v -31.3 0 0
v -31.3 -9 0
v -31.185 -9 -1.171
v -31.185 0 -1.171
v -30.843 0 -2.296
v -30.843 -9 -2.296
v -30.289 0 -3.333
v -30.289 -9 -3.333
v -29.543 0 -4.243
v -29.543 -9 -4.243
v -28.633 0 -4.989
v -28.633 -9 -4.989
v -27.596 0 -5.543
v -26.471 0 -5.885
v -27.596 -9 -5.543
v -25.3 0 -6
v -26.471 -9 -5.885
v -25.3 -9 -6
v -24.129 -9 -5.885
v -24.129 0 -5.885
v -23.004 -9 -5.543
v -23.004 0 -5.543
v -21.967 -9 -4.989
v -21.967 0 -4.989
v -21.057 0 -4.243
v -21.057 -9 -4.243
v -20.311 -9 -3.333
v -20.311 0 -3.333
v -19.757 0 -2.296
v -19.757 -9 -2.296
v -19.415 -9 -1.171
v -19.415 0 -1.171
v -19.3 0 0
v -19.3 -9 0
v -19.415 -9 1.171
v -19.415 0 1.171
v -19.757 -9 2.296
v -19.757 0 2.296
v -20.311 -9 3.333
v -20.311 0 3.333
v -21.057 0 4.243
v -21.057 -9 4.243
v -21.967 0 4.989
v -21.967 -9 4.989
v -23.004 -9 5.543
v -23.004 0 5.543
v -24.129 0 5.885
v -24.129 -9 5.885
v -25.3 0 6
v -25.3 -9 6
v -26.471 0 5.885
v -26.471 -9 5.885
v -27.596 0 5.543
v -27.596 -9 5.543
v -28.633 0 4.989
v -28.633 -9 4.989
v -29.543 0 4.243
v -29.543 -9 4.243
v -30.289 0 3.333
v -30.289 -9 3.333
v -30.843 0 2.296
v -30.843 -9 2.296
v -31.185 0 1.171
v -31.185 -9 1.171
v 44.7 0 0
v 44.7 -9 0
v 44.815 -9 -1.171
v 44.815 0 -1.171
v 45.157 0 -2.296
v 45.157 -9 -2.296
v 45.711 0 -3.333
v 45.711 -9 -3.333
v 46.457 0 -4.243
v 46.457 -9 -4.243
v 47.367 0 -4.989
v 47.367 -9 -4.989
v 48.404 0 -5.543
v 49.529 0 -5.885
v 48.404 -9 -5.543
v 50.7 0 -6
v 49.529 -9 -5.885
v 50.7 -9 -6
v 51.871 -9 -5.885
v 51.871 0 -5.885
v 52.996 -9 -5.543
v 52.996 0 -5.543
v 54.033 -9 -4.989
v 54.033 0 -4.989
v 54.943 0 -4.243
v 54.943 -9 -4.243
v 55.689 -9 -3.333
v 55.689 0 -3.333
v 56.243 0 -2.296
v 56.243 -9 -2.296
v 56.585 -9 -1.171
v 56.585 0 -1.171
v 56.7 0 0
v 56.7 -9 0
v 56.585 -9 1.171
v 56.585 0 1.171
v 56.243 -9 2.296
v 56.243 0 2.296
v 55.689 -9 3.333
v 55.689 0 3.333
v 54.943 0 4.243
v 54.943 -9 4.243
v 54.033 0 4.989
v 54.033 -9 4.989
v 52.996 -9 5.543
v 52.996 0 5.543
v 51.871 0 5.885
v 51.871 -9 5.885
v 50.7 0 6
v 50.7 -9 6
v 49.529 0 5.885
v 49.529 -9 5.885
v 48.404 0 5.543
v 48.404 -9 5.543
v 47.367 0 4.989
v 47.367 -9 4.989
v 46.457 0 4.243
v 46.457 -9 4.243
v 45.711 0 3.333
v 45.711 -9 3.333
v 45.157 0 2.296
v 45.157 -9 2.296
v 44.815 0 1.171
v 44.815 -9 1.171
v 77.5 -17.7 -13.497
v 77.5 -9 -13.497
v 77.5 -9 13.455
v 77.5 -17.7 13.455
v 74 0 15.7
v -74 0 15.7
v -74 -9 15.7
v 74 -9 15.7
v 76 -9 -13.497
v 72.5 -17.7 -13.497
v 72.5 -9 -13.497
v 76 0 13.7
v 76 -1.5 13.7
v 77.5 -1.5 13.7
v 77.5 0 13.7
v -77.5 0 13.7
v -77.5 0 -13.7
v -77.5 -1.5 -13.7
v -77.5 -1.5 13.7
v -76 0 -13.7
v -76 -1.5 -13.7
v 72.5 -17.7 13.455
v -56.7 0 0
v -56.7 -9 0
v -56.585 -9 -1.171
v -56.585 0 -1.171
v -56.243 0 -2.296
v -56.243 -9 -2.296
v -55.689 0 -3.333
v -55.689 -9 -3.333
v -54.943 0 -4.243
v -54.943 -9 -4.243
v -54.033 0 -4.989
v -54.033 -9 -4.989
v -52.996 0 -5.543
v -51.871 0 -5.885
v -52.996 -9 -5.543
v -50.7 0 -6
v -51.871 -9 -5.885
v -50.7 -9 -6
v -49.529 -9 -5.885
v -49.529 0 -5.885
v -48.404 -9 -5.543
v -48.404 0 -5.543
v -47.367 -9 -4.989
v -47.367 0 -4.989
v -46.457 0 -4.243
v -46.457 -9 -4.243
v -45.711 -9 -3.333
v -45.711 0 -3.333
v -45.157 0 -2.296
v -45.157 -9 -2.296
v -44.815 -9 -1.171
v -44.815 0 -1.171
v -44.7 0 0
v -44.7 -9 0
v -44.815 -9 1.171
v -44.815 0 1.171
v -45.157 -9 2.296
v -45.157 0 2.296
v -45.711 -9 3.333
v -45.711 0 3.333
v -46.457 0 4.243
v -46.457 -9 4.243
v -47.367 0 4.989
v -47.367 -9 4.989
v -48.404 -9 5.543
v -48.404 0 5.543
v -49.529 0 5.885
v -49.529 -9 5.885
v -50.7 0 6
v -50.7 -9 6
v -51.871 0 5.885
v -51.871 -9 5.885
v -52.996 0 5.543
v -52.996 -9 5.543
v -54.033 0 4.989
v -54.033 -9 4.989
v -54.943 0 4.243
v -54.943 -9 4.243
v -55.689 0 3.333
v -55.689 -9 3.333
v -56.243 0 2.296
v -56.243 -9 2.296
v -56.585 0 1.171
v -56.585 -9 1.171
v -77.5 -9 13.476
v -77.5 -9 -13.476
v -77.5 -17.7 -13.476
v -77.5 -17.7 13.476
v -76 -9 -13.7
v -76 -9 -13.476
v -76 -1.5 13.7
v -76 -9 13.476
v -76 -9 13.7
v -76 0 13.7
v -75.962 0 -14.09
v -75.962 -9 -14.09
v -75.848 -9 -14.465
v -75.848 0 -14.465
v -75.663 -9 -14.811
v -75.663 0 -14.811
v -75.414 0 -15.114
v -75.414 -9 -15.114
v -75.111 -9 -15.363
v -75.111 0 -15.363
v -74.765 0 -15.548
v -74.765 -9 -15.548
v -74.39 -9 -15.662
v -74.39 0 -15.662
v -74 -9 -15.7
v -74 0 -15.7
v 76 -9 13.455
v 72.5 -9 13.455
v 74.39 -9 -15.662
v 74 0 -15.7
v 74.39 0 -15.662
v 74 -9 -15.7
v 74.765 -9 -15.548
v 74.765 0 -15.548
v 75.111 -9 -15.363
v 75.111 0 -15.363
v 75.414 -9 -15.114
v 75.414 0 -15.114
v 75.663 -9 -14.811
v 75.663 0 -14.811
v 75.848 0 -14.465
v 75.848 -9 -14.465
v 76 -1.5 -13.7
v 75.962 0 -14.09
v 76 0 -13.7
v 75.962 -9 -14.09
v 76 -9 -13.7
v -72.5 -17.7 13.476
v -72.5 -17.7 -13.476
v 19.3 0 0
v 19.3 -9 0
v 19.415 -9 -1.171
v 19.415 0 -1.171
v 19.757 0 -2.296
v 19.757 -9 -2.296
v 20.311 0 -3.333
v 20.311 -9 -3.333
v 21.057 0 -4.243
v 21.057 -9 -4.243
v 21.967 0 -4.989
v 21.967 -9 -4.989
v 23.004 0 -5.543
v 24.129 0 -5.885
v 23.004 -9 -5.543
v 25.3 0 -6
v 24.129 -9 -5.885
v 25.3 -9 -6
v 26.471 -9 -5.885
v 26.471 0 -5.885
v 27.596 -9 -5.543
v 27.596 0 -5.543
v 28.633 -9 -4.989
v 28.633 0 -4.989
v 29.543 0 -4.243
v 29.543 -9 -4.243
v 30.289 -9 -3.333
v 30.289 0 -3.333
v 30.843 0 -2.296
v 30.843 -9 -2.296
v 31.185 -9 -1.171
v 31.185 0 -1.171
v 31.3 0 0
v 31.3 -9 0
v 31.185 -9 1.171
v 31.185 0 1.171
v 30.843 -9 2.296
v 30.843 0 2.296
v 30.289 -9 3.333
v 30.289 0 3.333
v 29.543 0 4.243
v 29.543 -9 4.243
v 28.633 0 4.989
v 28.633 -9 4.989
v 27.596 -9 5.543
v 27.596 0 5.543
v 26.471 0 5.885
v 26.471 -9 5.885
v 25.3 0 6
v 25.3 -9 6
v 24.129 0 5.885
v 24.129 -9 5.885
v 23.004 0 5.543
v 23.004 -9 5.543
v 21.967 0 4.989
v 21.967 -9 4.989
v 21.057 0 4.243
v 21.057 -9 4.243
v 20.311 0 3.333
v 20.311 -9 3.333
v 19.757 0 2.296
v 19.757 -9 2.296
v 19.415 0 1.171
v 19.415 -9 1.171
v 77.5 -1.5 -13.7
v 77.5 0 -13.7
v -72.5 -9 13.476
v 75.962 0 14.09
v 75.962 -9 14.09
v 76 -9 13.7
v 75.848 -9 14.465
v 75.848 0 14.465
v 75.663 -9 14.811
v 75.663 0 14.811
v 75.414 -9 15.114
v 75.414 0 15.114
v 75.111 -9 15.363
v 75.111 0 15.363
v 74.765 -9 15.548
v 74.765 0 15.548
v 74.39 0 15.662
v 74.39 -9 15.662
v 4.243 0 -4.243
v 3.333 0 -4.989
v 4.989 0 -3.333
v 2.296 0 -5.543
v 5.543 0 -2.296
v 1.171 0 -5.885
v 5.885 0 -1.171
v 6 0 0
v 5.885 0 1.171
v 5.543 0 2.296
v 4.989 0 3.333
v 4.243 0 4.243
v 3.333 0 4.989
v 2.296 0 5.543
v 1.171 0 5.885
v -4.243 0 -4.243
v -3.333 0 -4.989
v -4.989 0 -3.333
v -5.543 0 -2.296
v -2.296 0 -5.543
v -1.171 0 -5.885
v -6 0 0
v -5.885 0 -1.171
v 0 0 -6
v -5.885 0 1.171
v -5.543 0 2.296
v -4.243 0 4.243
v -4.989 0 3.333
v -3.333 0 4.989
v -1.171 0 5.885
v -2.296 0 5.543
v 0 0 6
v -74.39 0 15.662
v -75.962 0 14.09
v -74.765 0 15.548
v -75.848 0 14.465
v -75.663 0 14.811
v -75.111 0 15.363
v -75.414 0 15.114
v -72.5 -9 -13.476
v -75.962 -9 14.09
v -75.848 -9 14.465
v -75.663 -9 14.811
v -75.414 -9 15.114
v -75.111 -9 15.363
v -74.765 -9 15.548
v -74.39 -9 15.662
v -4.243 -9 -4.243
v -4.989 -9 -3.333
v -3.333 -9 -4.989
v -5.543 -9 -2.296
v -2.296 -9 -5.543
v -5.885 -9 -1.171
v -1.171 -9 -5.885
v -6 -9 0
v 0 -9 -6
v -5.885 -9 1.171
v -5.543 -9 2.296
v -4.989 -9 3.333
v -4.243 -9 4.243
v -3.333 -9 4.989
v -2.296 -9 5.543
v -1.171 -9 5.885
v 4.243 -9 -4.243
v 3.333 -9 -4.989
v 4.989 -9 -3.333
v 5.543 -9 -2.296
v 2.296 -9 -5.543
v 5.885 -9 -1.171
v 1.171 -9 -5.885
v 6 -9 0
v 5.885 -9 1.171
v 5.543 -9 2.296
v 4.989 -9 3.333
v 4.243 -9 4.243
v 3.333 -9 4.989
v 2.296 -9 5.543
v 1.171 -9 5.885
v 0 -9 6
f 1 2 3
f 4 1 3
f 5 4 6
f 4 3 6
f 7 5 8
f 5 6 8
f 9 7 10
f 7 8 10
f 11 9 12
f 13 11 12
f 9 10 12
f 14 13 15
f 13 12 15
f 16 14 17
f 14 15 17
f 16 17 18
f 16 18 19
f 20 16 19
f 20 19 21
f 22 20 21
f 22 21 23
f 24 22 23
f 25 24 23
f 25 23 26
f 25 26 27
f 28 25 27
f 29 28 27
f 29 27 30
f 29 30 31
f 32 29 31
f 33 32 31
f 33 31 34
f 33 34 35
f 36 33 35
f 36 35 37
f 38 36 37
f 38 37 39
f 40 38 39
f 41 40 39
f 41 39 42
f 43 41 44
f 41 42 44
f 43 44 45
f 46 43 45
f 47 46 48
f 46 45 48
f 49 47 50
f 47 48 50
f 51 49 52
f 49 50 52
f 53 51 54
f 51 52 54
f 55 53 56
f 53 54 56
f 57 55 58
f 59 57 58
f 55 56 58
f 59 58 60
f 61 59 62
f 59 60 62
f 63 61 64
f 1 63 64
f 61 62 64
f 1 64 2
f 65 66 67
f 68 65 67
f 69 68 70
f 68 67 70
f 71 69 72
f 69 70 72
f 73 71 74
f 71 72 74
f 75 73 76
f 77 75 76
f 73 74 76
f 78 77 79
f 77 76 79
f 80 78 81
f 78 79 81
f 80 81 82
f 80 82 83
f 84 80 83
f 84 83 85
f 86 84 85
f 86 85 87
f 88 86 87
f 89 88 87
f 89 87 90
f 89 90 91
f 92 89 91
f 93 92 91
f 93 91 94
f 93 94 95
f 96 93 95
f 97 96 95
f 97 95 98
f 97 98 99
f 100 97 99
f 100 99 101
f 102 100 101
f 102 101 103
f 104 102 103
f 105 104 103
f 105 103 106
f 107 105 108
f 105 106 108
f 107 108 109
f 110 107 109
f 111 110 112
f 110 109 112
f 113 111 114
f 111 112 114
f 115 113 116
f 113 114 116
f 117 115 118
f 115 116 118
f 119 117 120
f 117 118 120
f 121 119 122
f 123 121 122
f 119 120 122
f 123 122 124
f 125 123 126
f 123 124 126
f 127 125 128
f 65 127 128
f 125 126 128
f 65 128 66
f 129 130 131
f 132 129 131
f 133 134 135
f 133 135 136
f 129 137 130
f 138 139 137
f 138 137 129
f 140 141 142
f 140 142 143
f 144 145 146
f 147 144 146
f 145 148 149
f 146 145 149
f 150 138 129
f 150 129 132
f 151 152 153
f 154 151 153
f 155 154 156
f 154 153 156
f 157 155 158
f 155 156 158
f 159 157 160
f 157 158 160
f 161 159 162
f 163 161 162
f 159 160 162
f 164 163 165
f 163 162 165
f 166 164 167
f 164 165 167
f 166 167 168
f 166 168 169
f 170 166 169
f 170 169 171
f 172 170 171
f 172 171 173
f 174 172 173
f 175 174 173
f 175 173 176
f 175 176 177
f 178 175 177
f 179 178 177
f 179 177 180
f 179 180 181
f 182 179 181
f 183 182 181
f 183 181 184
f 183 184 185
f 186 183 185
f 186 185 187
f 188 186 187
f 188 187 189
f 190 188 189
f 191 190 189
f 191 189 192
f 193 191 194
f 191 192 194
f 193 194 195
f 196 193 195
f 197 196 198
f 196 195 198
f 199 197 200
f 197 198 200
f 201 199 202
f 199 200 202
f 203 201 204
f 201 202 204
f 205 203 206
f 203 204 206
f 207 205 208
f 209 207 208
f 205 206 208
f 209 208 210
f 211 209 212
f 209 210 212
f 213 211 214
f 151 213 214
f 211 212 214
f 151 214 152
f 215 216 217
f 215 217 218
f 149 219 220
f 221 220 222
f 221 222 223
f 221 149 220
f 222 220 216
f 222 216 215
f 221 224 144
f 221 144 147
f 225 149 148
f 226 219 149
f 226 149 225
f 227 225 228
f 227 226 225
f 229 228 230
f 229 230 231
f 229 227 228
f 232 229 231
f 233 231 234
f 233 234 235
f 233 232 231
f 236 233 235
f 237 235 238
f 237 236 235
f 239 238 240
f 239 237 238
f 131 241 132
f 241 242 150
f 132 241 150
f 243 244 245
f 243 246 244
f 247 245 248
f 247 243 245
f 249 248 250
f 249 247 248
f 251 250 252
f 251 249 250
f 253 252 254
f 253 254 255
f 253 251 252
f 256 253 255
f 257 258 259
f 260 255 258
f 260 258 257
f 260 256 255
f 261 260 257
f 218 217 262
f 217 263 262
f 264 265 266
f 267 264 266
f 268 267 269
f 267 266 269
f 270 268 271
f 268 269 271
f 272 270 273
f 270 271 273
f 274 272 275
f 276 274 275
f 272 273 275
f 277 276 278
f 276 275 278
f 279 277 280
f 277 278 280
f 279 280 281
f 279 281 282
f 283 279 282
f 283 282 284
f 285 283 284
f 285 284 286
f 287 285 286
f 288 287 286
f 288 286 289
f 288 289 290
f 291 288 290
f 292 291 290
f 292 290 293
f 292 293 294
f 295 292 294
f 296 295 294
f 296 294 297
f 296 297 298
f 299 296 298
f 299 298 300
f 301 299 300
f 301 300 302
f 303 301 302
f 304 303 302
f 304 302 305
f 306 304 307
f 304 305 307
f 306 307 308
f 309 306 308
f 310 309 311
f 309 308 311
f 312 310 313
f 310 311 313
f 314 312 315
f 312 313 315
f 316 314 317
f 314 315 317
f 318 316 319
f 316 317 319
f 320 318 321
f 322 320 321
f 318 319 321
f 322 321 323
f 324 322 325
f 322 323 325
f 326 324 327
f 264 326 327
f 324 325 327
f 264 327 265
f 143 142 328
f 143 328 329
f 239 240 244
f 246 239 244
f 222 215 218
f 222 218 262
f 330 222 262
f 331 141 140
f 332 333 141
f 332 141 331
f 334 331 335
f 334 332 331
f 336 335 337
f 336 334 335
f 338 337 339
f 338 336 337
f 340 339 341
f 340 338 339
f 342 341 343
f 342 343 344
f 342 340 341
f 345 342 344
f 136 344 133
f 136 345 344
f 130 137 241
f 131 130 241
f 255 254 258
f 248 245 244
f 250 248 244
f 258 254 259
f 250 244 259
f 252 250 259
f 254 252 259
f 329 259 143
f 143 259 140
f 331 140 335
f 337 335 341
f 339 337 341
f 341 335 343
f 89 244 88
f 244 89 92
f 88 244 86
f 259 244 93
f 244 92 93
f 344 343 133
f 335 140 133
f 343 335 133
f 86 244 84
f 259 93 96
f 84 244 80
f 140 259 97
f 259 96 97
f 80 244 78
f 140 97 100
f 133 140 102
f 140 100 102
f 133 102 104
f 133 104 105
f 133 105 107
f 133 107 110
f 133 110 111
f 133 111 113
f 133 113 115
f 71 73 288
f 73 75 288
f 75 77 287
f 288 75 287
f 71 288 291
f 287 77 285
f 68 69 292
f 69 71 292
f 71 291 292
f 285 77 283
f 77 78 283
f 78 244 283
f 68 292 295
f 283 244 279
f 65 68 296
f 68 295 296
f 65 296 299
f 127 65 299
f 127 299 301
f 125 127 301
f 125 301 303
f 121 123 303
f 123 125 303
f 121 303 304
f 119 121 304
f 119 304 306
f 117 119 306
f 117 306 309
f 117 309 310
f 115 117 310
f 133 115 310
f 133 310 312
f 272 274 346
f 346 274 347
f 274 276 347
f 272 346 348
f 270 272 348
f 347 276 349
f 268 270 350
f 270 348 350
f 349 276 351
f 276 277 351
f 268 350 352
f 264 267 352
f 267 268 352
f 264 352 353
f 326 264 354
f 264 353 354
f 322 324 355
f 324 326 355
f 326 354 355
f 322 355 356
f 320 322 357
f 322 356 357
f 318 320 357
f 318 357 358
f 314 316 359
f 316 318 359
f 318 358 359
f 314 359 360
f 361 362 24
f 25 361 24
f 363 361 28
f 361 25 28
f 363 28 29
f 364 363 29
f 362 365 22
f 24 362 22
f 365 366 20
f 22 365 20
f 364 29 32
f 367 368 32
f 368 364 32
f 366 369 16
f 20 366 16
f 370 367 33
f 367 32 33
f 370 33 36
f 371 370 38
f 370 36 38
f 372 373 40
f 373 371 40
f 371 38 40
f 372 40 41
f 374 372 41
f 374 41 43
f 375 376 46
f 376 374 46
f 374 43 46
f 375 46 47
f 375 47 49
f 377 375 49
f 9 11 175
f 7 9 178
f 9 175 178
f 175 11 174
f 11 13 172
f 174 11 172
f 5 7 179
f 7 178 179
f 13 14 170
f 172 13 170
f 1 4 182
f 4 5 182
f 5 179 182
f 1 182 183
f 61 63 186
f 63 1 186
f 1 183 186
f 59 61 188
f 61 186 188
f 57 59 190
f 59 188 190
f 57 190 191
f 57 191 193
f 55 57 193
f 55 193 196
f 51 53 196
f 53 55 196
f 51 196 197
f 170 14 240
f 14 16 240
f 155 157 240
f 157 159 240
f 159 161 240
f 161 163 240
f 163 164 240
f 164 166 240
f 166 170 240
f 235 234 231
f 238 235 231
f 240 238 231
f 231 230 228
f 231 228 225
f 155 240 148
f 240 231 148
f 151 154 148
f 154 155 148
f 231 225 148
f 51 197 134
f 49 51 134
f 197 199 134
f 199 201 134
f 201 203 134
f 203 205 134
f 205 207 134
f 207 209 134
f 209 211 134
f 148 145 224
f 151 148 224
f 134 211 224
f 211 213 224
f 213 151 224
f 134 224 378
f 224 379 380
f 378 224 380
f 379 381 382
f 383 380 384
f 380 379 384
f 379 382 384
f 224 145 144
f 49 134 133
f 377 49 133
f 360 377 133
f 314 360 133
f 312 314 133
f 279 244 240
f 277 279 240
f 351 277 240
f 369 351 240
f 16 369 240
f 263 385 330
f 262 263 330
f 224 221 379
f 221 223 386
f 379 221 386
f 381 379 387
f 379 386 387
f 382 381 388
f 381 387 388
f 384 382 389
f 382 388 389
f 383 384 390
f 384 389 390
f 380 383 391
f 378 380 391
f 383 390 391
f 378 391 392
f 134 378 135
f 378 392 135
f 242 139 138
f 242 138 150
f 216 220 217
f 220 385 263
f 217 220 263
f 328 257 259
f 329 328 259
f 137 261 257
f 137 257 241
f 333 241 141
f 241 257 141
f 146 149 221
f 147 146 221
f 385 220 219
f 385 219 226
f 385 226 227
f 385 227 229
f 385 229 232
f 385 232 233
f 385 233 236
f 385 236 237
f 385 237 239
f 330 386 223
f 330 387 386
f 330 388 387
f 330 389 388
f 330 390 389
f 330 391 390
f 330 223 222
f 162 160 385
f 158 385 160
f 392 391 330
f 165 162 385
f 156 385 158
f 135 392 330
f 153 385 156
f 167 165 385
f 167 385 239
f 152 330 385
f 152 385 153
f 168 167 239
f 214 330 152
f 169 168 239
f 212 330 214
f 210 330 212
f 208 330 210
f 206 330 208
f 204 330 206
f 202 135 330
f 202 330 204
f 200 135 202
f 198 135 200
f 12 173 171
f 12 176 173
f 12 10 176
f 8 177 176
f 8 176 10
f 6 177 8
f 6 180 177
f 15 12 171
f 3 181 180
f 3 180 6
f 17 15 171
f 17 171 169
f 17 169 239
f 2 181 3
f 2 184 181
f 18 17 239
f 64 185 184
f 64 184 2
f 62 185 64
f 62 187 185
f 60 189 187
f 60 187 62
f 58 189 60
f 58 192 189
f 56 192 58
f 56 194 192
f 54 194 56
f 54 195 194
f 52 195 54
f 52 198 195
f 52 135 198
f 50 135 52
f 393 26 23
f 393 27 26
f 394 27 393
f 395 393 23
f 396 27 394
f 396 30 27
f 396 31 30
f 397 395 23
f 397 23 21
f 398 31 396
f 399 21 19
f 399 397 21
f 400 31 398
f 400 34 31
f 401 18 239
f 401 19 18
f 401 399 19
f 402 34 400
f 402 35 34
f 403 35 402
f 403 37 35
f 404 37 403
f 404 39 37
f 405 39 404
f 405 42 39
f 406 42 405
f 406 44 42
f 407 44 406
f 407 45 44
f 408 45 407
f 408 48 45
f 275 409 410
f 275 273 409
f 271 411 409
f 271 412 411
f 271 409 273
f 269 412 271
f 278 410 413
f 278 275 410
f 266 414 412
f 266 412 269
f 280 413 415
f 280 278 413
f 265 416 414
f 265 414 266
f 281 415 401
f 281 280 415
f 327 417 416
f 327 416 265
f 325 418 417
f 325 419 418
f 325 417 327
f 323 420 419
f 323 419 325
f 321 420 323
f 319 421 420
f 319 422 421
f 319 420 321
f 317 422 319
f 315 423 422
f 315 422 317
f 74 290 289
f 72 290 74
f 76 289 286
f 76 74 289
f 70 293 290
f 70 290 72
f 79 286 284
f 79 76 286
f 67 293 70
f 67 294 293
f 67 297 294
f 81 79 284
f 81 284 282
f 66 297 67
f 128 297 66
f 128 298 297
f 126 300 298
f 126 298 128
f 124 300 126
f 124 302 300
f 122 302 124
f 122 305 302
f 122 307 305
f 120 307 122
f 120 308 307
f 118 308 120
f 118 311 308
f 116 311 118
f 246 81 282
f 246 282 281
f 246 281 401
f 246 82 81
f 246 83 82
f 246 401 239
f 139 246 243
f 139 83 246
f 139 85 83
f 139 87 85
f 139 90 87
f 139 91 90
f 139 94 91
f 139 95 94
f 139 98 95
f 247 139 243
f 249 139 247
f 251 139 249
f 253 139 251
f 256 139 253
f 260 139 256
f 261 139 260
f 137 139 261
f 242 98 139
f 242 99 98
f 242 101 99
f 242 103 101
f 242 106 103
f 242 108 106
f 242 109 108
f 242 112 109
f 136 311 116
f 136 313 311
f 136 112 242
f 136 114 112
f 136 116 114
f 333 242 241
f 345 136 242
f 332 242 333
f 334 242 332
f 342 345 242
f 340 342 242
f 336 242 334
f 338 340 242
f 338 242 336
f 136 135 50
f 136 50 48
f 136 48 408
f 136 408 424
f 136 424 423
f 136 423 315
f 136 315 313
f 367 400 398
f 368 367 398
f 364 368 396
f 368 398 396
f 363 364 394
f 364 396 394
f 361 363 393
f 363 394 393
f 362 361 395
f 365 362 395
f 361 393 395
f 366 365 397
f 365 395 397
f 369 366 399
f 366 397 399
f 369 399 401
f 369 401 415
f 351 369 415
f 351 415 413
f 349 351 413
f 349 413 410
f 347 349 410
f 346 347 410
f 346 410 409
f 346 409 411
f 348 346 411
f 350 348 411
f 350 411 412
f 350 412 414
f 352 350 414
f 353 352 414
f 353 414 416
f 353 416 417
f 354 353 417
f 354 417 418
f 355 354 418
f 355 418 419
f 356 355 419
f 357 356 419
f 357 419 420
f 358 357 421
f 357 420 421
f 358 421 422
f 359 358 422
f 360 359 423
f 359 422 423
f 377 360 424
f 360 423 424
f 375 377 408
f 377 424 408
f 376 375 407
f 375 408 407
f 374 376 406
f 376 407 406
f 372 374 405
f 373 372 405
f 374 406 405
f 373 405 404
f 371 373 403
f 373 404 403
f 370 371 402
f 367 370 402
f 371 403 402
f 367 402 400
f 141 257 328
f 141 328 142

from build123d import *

# Parameters (mm, degrees)
F0_W      = 152
F0_H      = 31.4
F1_DEPTH  = 9
F2_R      = 2
F3_W      = 3
F3_H      = 26.9515514374
F4_DEPTH  = 8.7
F5_DEPTH  = 2
F6_DEPTH  = 2
F7_W      = 1.5
F7_H      = 27.4
F8_DEPTH  = 1.5
F9_W      = 1.5
F9_H      = 27.4
F10_DEPTH = 1.5
F11_D     = 12
F11_DEPTH = 10
F11_TIP   = 3.6051637142


with BuildPart() as f1:
    # F0 (on Front) → F1 (new body)
    with BuildSketch(Plane.XZ):
        Rectangle(F0_W, F0_H)
    extrude(amount=F1_DEPTH)

    # F2
    f2_edges = [f1.edges().sort_by_distance(p)[0] for p in [
        (76, -4.5, 15.7),
        (76, -4.5, -15.7),
        (-76, -4.5, -15.7),
        (-76, -4.5, 15.7),
    ]]
    fillet(f2_edges, radius=F2_R)

    # F3 (on face) → F4 (join)
    with BuildSketch(Plane.XZ.offset(9)):
        with Locations((-74, 0)):
            Rectangle(F3_W, F3_H)
        with Locations((74, -0.0208395504)):
            Rectangle(F3_W, F3_H)
    extrude(amount=F4_DEPTH)

    # F5 (add): a face of the model
    f5_faces = [f1.faces().sort_by_distance(p)[0] for p in [
        (-75.5, -13.35, 0),
    ]]
    extrude(f5_faces, amount=F5_DEPTH)

    # F6 (add): a face of the model
    f6_faces = [f1.faces().sort_by_distance(p)[0] for p in [
        (75.5, -13.35, -0.0208395504),
    ]]
    extrude(f6_faces, amount=F6_DEPTH)

    # F7 (on face) → F8 (join)
    with BuildSketch(Plane(origin=(-76, 0, 0), x_dir=(0, -1, 0), z_dir=(-1, 0, 0))):
        with Locations((0.75, 0)):
            Rectangle(F7_W, F7_H)
    extrude(amount=F8_DEPTH)

    # F9 (on face) → F10 (join)
    with BuildSketch(Plane.YZ.offset(76)):
        with Locations((-0.75, 0)):
            Rectangle(F9_W, F9_H)
    extrude(amount=F10_DEPTH)

    # F11
    with Locations(Plane(origin=(0, 0, 0), x_dir=(1, 0, 0), z_dir=(0, 1, 0))):
        with Locations((-50.7, 0), (-25.3, 0), (25.3, 0), (0, 0), (50.7, 0)):
            Hole(F11_D / 2, depth=F11_DEPTH)
            with Locations((0, 0, -(F11_DEPTH + F11_TIP / 2))):  # 118° drill point
                Cone(0, F11_D / 2, F11_TIP, mode=Mode.SUBTRACT)


solid = f1.part
